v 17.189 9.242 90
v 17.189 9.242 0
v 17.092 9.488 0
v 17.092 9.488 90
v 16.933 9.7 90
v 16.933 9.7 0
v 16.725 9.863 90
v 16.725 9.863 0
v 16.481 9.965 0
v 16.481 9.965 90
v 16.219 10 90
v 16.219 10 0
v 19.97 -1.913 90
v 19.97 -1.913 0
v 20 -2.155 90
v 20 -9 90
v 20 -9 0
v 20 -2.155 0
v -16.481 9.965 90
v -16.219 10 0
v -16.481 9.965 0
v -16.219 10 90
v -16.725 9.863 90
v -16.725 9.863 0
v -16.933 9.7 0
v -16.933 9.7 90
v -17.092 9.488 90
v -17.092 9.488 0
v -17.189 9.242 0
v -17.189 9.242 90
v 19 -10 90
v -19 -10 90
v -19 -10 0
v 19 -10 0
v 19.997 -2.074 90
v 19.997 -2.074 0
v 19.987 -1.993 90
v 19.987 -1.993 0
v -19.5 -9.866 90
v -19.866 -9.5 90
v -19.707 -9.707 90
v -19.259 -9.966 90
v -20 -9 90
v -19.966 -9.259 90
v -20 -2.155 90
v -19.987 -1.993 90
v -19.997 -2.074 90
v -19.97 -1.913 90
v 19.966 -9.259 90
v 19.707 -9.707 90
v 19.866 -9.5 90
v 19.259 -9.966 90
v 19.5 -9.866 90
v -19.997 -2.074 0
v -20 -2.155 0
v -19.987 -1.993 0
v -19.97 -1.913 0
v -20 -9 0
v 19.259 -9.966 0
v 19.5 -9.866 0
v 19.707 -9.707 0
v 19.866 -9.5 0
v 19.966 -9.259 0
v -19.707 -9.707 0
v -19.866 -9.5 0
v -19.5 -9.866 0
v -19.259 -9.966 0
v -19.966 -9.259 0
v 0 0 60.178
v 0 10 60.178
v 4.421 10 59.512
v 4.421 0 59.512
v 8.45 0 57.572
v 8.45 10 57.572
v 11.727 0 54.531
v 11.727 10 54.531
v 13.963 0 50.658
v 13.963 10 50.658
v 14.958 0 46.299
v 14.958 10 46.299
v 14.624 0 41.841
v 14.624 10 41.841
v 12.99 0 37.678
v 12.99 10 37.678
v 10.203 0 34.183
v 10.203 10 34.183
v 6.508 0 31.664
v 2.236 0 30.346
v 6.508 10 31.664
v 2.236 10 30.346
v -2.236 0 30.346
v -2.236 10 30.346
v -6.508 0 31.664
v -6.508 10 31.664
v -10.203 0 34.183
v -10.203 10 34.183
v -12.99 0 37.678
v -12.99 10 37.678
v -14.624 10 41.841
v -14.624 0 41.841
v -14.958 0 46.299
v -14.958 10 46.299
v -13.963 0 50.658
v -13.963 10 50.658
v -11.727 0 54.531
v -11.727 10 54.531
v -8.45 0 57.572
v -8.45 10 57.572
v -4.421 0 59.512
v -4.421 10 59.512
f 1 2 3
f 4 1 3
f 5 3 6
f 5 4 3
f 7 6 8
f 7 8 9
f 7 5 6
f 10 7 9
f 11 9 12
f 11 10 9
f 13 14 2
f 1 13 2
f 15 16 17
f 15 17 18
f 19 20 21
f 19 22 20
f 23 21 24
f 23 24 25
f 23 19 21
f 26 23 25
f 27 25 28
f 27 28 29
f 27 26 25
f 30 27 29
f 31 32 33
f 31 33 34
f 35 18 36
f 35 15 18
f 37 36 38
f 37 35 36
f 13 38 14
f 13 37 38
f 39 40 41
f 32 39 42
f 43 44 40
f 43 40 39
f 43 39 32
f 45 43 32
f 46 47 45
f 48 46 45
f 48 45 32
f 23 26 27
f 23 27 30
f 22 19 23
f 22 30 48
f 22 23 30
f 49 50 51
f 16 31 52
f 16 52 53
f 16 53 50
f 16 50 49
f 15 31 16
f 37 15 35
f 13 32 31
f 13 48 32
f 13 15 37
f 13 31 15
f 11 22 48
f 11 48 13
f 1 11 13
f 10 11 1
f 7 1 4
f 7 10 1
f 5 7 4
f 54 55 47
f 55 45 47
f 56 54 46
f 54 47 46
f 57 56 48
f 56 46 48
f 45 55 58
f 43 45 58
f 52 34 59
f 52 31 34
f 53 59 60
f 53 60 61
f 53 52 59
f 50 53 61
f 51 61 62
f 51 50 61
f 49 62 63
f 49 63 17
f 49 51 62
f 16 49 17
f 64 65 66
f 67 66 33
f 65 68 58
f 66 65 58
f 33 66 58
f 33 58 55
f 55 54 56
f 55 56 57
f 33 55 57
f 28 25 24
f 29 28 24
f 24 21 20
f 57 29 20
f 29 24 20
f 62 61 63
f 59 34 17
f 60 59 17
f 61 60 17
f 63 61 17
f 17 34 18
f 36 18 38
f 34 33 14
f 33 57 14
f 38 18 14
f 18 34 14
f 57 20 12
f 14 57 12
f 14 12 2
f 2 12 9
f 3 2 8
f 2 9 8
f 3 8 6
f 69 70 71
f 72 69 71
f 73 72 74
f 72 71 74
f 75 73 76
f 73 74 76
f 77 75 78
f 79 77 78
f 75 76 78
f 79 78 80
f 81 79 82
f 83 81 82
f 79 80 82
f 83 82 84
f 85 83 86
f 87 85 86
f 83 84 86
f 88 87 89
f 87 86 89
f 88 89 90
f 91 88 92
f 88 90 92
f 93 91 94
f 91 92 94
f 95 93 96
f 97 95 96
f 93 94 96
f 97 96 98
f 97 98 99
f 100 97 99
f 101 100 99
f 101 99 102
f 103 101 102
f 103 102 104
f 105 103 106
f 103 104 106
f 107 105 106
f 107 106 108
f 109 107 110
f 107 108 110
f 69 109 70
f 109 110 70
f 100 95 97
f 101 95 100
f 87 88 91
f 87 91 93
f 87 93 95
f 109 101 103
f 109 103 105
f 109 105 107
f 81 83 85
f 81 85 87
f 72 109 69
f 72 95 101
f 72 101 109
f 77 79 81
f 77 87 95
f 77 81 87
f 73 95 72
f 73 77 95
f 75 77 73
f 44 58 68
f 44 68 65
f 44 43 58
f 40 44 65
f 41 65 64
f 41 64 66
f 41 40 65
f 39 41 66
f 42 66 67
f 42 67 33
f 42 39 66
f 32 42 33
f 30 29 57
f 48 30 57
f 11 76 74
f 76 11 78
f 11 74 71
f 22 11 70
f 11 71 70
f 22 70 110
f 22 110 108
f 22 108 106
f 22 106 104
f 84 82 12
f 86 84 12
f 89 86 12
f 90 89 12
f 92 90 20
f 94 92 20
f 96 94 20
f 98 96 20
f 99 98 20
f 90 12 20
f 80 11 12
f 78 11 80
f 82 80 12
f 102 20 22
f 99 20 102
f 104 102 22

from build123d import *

# Parameters (mm, degrees)
BOSS_EXTRUDE1_DEPTH = 90
FILLET1_R           = 1
SKETCH2_R           = 15
CUT_EXTRUDE1_DEPTH  = 10


with BuildPart() as part:
    # Sketch1 → Boss-Extrude1 (new body)
    with BuildSketch(Plane.XY):
        Polygon((-20, -2.032342801), (-20, -10), (20, -10), (20, -2.032342801), (17, 10), (-17, 10), align=None)
    extrude(amount=BOSS_EXTRUDE1_DEPTH)

    # Fillet1
    fillet1_edges = [part.edges().sort_by_distance(p)[0] for p in [
        (17, 10, 45),
        (20, -2.032342801, 45),
        (20, -10, 45),
        (-20, -10, 45),
        (-20, -2.032342801, 45),
        (-17, 10, 45),
    ]]
    fillet(fillet1_edges, radius=FILLET1_R)

    # Sketch2 → Cut-Extrude1 (cut)
    with BuildSketch(Plane(origin=(0, 10, 0), x_dir=(1, 0, 0), z_dir=(0, 1, 0))):
        with Locations(Location((0, -45.17837191, 0), (0, 0, 270))):
            Circle(SKETCH2_R)
    extrude(amount=-CUT_EXTRUDE1_DEPTH, mode=Mode.SUBTRACT)


solid = part.part
